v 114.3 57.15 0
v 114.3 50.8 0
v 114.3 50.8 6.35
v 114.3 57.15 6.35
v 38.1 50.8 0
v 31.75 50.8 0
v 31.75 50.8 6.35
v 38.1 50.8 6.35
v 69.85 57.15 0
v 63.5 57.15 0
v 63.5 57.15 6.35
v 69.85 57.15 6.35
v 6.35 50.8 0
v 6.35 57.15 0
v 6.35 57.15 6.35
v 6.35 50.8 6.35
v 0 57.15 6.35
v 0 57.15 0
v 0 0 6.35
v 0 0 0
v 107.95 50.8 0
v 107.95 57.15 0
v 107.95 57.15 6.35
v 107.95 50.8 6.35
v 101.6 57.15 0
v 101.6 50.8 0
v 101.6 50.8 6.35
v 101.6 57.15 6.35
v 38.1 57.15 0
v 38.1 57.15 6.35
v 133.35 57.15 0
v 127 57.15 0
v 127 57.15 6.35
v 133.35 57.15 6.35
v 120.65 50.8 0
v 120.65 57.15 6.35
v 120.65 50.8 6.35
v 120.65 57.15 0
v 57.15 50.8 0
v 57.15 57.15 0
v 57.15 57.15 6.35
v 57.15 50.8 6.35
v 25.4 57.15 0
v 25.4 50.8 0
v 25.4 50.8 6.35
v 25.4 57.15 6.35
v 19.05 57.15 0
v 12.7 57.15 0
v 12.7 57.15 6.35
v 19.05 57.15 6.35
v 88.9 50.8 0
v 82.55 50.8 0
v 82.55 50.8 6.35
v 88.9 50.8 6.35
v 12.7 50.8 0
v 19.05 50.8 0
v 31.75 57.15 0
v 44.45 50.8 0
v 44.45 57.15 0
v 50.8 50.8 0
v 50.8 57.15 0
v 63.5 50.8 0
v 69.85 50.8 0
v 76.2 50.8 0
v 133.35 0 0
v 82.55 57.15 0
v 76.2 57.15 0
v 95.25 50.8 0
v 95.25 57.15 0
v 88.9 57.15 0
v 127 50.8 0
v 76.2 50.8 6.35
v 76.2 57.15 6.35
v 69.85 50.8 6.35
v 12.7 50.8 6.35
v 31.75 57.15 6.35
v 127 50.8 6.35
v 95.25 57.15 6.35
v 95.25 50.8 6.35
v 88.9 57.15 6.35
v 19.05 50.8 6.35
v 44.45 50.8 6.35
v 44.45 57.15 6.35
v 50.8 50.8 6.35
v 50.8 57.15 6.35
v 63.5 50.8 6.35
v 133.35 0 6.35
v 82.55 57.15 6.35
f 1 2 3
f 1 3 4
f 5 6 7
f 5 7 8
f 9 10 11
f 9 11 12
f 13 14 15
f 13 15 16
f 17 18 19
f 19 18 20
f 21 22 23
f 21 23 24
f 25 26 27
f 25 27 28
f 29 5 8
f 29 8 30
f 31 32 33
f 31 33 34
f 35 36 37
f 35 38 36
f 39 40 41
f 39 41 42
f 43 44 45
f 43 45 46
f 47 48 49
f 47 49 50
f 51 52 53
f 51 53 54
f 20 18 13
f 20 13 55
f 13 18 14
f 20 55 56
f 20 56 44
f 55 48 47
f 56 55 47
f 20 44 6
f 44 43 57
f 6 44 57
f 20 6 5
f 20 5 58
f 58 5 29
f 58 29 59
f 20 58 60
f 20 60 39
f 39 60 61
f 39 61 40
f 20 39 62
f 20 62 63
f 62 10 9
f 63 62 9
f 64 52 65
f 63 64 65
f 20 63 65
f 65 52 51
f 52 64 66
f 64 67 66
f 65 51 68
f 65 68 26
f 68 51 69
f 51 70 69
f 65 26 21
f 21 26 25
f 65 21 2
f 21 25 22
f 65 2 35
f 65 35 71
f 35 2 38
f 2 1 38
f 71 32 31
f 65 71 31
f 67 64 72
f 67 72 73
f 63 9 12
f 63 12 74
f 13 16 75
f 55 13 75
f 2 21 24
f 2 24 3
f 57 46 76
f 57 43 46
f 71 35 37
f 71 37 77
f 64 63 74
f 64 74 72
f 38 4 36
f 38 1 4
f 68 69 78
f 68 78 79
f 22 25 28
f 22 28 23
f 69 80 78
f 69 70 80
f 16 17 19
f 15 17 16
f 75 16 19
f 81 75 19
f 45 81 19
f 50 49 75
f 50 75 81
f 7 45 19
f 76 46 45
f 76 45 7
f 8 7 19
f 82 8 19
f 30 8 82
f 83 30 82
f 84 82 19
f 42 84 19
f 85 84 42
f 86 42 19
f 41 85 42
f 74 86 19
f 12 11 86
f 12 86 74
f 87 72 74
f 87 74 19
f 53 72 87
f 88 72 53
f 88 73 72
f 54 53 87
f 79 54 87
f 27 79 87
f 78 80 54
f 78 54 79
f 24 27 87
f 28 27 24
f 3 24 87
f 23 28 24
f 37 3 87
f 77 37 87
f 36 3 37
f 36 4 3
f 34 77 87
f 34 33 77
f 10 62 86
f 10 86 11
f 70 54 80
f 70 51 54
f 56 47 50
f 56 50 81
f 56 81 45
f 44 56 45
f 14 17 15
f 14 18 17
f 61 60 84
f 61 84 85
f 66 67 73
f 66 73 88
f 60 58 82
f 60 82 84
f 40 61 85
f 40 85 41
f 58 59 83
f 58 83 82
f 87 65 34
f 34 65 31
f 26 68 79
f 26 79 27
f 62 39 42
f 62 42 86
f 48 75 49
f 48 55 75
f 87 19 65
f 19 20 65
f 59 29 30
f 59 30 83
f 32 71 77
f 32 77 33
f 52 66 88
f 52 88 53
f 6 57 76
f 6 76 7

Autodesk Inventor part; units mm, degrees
ref_plane "YZ Plane" through (0, 0, 0) normal (1, 0, 0) x (0, 1, 0)
ref_plane "XZ Plane" through (0, 0, 0) normal (0, 1, 0) x (-1, 0, 0)
ref_plane "XY Plane" through (0, 0, 0) normal (0, 0, 1) x (1, 0, 0)
sketch "Sketch2" plane through (0, 0, 0) normal (0, 0, 1) x (1, 0, 0)
  line L0 (0, 0) -> (133.35, 0)
  line L1 (133.35, 0) -> (133.35, 57.15)
  line L2 (0, 57.15) -> (0, 0)
  line L3 (0, 57.15) -> (6.35, 57.15)
  line L4 (6.35, 57.15) -> (6.35, 50.8)
  line L5 (6.35, 50.8) -> (12.7, 50.8)
  line L6 (12.7, 50.8) -> (12.7, 57.15)
  line L7 (12.7, 57.15) -> (19.05, 57.15)
  line L8 (19.05, 57.15) -> (19.05, 50.8)
  line L9 (19.05, 50.8) -> (25.4, 50.8)
  line L10 (25.4, 50.8) -> (25.4, 57.15)
  line L11 (25.4, 57.15) -> (31.75, 57.15)
  line L12 (31.75, 57.15) -> (31.75, 50.8)
  line L13 (31.75, 50.8) -> (38.1, 50.8)
  line L14 (38.1, 50.8) -> (38.1, 57.15)
  line L15 (38.1, 57.15) -> (44.45, 57.15)
  line L16 (44.45, 57.15) -> (44.45, 50.8)
  line L17 (44.45, 50.8) -> (50.8, 50.8)
  line L18 (50.8, 50.8) -> (50.8, 57.15)
  line L19 (50.8, 57.15) -> (57.15, 57.15)
  line L20 (57.15, 57.15) -> (57.15, 50.8)
  line L21 (57.15, 50.8) -> (63.5, 50.8)
  line L22 (63.5, 50.8) -> (63.5, 57.15)
  line L23 (63.5, 57.15) -> (69.85, 57.15)
  line L24 (69.85, 57.15) -> (69.85, 50.8)
  line L25 (69.85, 50.8) -> (76.2, 50.8)
  line L26 (76.2, 50.8) -> (76.2, 57.15)
  line L27 (76.2, 57.15) -> (82.55, 57.15)
  line L28 (82.55, 57.15) -> (82.55, 50.8)
  line L29 (82.55, 50.8) -> (88.9, 50.8)
  line L30 (88.9, 50.8) -> (88.9, 57.15)
  line L31 (88.9, 57.15) -> (95.25, 57.15)
  line L32 (95.25, 57.15) -> (95.25, 50.8)
  line L33 (95.25, 50.8) -> (101.6, 50.8)
  line L34 (101.6, 50.8) -> (101.6, 57.15)
  line L35 (101.6, 57.15) -> (107.95, 57.15)
  line L36 (107.95, 57.15) -> (107.95, 50.8)
  line L37 (107.95, 50.8) -> (114.3, 50.8)
  line L38 (114.3, 50.8) -> (114.3, 57.15)
  line L39 (114.3, 57.15) -> (120.65, 57.15)
  line L40 (120.65, 57.15) -> (120.65, 50.8)
  line L41 (120.65, 50.8) -> (127, 50.8)
  line L42 (127, 50.8) -> (127, 57.15)
  line L43 (127, 57.15) -> (133.35, 57.15)
  dimension "Length" = 133.35
  dimension "Height" = 57.15
  dimension "Teeth_Width" = 6.35
  dimension "Material_Thickness" = 6.35
  dimension "d63" = 6.35
  dimension "d64" = 6.35
  dimension "d65" = 6.35
  dimension "d66" = 6.35
  dimension "d67" = 6.35
  dimension "d68" = 6.35
  dimension "d69" = 6.35
  dimension "d70" = 6.35
  dimension "d71" = 6.35
  dimension "d72" = 6.35
  dimension "d73" = 6.35
  dimension "d74" = 6.35
  dimension "d75" = 6.35
  dimension "d76" = 6.35
  dimension "d77" = 6.35
  dimension "d78" = 6.35
  dimension "d79" = 6.35
  dimension "d80" = 6.35
  dimension "d81" = 6.35
  dimension "d82" = 6.35
  dimension "d83" = 6.35
  dimension "d84" = 6.35
  dimension "d85" = 6.35
  dimension "d86" = 6.35
  dimension "d87" = 6.35
  dimension "d88" = 6.35
  dimension "d89" = 6.35
  dimension "d90" = 6.35
extrude "Extrusion2" add sketch "Sketch2" along normal blind 6.35
equation "\"d63\" = Teeth_Width"
equation "\"d66\" = d64"
equation "\"d69\" = d67"
equation "\"d72\" = d70"
equation "\"d75\" = d73"
equation "\"d78\" = d76"
equation "\"d81\" = d79"
equation "\"d84\" = d82"
equation "\"d87\" = d85"
equation "\"d90\" = d88"
properties part number "Side Support"
